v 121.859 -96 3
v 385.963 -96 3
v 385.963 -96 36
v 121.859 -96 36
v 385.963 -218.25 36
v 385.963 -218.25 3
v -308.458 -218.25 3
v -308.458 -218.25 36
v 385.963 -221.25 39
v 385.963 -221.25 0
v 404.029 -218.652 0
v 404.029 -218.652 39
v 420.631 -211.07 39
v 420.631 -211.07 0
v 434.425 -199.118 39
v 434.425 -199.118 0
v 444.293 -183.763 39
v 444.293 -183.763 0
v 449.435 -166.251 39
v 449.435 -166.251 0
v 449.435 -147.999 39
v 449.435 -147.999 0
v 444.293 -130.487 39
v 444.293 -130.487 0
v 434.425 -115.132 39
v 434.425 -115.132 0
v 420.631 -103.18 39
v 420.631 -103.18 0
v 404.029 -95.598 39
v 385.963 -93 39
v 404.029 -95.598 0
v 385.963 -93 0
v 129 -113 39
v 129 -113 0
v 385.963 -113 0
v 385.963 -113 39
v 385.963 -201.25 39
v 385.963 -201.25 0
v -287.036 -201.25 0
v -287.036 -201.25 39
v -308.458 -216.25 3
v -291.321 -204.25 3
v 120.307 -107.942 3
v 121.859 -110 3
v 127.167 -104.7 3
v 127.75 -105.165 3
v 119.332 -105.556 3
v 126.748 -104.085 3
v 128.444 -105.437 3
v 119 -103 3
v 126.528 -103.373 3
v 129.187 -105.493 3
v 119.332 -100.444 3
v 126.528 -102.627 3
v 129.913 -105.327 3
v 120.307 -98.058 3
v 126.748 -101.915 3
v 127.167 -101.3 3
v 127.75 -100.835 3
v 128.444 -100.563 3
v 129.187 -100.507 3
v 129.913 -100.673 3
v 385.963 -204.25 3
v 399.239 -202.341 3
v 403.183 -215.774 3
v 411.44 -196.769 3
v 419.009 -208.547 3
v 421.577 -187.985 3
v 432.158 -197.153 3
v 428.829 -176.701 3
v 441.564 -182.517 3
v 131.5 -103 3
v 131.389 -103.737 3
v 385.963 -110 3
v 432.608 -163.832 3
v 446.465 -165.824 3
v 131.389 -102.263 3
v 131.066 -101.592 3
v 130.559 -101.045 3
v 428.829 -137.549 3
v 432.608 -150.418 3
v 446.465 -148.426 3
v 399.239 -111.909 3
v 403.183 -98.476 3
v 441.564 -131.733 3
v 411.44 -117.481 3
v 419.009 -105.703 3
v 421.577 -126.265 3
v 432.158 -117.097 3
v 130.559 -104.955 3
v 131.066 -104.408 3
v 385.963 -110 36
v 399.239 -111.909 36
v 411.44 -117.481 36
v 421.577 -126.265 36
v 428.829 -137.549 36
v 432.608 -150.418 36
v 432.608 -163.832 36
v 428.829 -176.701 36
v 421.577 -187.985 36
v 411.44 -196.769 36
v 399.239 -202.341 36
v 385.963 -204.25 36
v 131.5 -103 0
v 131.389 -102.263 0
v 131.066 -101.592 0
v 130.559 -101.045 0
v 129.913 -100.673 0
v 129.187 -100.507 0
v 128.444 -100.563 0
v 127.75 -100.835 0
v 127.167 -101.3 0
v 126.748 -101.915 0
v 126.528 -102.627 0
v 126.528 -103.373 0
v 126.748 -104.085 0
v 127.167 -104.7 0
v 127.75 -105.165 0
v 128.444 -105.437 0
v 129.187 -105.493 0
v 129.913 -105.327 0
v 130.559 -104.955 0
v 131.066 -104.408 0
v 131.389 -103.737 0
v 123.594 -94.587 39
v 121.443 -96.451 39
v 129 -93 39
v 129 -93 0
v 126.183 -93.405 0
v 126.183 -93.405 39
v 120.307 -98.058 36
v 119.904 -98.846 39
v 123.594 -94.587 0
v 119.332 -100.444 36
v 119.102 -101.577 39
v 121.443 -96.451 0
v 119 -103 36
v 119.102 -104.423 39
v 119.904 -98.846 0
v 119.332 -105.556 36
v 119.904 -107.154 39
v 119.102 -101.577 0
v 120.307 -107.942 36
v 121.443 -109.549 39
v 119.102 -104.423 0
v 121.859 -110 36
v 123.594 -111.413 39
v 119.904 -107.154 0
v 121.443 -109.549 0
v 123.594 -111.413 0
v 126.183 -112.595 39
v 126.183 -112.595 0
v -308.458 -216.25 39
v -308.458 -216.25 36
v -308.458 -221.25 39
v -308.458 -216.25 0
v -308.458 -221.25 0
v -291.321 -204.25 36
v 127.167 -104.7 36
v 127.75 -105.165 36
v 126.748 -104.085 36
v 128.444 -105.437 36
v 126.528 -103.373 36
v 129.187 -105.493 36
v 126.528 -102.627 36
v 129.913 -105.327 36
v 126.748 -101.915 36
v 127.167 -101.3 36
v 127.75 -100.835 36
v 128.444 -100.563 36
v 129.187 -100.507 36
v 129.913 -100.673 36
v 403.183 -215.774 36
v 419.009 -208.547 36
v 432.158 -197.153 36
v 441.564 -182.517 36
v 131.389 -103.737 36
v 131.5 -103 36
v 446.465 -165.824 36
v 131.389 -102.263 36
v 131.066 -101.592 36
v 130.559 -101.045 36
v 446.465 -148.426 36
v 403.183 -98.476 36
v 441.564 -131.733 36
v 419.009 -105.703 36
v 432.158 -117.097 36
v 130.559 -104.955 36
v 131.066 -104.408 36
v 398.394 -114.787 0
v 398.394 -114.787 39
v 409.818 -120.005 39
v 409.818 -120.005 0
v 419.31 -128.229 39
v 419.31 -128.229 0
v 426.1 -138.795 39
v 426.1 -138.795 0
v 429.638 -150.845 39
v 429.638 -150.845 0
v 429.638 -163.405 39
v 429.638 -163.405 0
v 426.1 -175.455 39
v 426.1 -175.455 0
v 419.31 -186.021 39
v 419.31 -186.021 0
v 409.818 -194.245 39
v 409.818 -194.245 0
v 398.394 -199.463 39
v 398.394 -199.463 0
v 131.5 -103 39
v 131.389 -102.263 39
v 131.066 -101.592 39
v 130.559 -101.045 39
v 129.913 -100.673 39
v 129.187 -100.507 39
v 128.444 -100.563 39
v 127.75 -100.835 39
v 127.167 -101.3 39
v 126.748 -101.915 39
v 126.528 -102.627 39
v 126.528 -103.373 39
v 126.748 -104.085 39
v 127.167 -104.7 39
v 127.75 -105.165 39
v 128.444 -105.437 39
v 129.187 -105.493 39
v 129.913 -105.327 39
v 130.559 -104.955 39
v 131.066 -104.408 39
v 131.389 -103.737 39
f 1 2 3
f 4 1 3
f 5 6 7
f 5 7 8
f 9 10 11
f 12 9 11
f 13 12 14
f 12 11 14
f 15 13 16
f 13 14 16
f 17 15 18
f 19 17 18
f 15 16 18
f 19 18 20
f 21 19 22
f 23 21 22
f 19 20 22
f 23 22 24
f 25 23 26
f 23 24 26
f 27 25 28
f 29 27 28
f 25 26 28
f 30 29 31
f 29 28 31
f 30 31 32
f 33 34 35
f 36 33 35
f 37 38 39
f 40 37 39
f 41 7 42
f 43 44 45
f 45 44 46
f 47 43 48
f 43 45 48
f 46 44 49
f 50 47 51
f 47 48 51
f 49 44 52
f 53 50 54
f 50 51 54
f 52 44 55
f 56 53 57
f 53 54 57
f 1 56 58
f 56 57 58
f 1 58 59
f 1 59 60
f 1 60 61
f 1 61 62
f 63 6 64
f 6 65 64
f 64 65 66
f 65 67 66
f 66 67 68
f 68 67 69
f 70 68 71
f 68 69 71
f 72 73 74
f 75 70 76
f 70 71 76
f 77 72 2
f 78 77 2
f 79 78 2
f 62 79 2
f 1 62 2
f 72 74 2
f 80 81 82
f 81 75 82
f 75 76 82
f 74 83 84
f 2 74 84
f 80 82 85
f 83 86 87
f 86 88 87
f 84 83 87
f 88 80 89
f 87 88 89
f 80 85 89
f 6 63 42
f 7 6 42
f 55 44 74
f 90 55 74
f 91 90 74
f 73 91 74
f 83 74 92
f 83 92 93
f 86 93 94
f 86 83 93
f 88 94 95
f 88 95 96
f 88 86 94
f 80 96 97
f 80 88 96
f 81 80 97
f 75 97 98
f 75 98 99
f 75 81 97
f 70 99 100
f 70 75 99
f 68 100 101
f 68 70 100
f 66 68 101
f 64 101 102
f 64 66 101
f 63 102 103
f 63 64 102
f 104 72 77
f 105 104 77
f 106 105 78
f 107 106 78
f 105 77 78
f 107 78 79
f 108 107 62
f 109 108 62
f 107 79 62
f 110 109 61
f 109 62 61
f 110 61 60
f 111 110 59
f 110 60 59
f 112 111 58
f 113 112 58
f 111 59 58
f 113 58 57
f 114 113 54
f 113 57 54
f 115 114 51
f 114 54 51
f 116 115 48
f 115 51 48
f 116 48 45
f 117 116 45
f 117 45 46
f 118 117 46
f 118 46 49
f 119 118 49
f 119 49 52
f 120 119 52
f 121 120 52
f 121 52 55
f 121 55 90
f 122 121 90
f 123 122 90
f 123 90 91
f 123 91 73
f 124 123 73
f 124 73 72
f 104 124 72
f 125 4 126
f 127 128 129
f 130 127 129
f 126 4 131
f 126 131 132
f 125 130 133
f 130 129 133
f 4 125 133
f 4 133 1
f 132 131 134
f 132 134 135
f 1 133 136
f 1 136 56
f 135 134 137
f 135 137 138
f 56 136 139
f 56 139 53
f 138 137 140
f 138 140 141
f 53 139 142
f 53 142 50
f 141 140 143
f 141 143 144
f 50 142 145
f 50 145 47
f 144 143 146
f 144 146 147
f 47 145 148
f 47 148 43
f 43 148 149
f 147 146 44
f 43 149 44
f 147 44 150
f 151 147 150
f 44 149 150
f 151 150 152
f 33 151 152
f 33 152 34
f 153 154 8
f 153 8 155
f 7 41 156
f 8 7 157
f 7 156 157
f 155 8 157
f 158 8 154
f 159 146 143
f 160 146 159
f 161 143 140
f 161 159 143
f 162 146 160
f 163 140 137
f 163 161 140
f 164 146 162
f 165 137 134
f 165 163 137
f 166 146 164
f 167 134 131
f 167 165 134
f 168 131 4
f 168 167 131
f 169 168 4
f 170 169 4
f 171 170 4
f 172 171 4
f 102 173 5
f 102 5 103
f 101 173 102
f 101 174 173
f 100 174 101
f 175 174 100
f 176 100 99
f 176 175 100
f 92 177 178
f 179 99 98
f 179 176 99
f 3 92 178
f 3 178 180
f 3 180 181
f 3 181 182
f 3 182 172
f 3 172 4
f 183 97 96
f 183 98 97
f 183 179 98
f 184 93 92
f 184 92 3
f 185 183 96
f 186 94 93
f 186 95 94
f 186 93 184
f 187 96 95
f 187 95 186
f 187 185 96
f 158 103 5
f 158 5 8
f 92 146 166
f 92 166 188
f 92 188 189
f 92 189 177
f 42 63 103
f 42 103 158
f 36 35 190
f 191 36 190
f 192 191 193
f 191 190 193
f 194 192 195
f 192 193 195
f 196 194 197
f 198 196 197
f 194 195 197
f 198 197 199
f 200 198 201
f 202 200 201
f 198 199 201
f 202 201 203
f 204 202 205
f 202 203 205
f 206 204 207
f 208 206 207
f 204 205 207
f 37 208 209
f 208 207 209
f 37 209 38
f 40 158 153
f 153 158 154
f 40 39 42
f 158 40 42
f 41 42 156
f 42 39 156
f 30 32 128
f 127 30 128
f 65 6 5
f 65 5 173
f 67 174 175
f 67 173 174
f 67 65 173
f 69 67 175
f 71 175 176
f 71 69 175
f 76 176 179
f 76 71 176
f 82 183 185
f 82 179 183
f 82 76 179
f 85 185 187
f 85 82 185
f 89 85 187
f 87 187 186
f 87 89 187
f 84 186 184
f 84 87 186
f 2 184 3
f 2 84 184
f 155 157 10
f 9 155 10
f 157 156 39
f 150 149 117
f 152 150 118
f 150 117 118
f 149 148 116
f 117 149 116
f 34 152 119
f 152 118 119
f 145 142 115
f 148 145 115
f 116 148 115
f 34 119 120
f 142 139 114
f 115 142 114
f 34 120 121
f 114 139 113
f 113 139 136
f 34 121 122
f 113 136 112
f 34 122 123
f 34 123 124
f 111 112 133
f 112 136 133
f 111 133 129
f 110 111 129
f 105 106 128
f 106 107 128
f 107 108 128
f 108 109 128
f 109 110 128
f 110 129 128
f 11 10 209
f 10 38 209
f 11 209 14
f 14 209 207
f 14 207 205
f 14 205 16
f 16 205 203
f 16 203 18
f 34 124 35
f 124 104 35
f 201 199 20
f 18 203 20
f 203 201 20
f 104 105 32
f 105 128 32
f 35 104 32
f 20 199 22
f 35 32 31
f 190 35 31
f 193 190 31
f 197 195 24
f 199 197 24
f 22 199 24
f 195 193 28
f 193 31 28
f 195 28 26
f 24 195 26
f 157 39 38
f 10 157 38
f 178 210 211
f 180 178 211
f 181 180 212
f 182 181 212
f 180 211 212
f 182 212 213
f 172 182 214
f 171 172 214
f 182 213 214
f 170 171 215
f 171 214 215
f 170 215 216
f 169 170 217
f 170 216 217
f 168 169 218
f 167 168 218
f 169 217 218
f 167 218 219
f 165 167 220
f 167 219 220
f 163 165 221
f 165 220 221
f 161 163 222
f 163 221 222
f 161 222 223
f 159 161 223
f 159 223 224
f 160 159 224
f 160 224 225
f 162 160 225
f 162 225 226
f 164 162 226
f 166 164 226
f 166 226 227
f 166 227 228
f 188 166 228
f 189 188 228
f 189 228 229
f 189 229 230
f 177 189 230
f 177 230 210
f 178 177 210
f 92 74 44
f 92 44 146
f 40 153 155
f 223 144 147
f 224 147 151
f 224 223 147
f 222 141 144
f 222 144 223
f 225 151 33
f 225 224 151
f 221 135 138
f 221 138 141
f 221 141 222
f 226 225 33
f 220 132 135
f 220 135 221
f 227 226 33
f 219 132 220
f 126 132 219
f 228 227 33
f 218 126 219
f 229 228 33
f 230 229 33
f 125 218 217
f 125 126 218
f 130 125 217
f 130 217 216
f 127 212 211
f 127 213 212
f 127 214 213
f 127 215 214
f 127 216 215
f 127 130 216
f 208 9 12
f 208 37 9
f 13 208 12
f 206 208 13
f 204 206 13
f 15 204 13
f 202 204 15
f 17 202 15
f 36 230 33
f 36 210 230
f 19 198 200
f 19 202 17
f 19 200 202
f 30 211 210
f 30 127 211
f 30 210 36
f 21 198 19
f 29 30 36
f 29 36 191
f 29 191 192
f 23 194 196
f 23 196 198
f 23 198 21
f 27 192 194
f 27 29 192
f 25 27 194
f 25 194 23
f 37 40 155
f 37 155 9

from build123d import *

# Parameters (mm, degrees)
BOSS_EXTRUDE1_DEPTH = 39
SHELL1_T            = -3
SKETCH2_W           = 33
SKETCH2_H           = 14
CUT_EXTRUDE1_DEPTH  = 730.858236947
SKETCH3_R           = 2.5
CUT_EXTRUDE2_DEPTH  = 504.042108716


with BuildPart() as part:
    # Sketch1 → Boss-Extrude1 (new body)
    with BuildSketch(Plane.XY):
        with BuildLine():
            Line((385.962547752, -201.25), (-287.036202121, -201.25))
            Line((-287.036202121, -201.25), (-308.458422222, -216.25))
            Line((-308.458422222, -216.25), (-308.458422222, -221.25))
            Line((-308.458422222, -221.25), (385.962547752, -221.25))
            ThreePointArc((385.962547752, -221.25), (450.087547752, -157.125), (385.962547752, -93))
            Line((385.962547752, -93), (129, -93))
            ThreePointArc((129, -93), (119, -103), (129, -113))
            Line((129, -113), (385.962547752, -113))
            ThreePointArc((385.962547752, -113), (430.087547752, -157.125), (385.962547752, -201.25))
        make_face()
    extrude(amount=BOSS_EXTRUDE1_DEPTH)

    # Shell1
    shell1_openings = [part.faces().sort_by_distance(p)[0] for p in [
        (-297.747312172, -208.75, 19.5),
    ]]
    offset(amount=SHELL1_T, openings=shell1_openings, kind=Kind.INTERSECTION)

    # Sketch2 → Cut-Extrude1 (cut, through all)
    with BuildSketch(Plane.ZY.offset(-385.962547752)):
        with Locations((19.5, -103)):
            Rectangle(SKETCH2_W, SKETCH2_H)
        with Locations((19.5, -211.25)):
            Rectangle(SKETCH2_W, SKETCH2_H)
    extrude(amount=CUT_EXTRUDE1_DEPTH, mode=Mode.SUBTRACT)

    # Sketch3 → Cut-Extrude2 (cut, through all)
    with BuildSketch(Plane.XY.offset(39)):
        with Locations((129, -103)):
            Circle(SKETCH3_R)
    extrude(amount=-CUT_EXTRUDE2_DEPTH, mode=Mode.SUBTRACT)


solid = part.part
